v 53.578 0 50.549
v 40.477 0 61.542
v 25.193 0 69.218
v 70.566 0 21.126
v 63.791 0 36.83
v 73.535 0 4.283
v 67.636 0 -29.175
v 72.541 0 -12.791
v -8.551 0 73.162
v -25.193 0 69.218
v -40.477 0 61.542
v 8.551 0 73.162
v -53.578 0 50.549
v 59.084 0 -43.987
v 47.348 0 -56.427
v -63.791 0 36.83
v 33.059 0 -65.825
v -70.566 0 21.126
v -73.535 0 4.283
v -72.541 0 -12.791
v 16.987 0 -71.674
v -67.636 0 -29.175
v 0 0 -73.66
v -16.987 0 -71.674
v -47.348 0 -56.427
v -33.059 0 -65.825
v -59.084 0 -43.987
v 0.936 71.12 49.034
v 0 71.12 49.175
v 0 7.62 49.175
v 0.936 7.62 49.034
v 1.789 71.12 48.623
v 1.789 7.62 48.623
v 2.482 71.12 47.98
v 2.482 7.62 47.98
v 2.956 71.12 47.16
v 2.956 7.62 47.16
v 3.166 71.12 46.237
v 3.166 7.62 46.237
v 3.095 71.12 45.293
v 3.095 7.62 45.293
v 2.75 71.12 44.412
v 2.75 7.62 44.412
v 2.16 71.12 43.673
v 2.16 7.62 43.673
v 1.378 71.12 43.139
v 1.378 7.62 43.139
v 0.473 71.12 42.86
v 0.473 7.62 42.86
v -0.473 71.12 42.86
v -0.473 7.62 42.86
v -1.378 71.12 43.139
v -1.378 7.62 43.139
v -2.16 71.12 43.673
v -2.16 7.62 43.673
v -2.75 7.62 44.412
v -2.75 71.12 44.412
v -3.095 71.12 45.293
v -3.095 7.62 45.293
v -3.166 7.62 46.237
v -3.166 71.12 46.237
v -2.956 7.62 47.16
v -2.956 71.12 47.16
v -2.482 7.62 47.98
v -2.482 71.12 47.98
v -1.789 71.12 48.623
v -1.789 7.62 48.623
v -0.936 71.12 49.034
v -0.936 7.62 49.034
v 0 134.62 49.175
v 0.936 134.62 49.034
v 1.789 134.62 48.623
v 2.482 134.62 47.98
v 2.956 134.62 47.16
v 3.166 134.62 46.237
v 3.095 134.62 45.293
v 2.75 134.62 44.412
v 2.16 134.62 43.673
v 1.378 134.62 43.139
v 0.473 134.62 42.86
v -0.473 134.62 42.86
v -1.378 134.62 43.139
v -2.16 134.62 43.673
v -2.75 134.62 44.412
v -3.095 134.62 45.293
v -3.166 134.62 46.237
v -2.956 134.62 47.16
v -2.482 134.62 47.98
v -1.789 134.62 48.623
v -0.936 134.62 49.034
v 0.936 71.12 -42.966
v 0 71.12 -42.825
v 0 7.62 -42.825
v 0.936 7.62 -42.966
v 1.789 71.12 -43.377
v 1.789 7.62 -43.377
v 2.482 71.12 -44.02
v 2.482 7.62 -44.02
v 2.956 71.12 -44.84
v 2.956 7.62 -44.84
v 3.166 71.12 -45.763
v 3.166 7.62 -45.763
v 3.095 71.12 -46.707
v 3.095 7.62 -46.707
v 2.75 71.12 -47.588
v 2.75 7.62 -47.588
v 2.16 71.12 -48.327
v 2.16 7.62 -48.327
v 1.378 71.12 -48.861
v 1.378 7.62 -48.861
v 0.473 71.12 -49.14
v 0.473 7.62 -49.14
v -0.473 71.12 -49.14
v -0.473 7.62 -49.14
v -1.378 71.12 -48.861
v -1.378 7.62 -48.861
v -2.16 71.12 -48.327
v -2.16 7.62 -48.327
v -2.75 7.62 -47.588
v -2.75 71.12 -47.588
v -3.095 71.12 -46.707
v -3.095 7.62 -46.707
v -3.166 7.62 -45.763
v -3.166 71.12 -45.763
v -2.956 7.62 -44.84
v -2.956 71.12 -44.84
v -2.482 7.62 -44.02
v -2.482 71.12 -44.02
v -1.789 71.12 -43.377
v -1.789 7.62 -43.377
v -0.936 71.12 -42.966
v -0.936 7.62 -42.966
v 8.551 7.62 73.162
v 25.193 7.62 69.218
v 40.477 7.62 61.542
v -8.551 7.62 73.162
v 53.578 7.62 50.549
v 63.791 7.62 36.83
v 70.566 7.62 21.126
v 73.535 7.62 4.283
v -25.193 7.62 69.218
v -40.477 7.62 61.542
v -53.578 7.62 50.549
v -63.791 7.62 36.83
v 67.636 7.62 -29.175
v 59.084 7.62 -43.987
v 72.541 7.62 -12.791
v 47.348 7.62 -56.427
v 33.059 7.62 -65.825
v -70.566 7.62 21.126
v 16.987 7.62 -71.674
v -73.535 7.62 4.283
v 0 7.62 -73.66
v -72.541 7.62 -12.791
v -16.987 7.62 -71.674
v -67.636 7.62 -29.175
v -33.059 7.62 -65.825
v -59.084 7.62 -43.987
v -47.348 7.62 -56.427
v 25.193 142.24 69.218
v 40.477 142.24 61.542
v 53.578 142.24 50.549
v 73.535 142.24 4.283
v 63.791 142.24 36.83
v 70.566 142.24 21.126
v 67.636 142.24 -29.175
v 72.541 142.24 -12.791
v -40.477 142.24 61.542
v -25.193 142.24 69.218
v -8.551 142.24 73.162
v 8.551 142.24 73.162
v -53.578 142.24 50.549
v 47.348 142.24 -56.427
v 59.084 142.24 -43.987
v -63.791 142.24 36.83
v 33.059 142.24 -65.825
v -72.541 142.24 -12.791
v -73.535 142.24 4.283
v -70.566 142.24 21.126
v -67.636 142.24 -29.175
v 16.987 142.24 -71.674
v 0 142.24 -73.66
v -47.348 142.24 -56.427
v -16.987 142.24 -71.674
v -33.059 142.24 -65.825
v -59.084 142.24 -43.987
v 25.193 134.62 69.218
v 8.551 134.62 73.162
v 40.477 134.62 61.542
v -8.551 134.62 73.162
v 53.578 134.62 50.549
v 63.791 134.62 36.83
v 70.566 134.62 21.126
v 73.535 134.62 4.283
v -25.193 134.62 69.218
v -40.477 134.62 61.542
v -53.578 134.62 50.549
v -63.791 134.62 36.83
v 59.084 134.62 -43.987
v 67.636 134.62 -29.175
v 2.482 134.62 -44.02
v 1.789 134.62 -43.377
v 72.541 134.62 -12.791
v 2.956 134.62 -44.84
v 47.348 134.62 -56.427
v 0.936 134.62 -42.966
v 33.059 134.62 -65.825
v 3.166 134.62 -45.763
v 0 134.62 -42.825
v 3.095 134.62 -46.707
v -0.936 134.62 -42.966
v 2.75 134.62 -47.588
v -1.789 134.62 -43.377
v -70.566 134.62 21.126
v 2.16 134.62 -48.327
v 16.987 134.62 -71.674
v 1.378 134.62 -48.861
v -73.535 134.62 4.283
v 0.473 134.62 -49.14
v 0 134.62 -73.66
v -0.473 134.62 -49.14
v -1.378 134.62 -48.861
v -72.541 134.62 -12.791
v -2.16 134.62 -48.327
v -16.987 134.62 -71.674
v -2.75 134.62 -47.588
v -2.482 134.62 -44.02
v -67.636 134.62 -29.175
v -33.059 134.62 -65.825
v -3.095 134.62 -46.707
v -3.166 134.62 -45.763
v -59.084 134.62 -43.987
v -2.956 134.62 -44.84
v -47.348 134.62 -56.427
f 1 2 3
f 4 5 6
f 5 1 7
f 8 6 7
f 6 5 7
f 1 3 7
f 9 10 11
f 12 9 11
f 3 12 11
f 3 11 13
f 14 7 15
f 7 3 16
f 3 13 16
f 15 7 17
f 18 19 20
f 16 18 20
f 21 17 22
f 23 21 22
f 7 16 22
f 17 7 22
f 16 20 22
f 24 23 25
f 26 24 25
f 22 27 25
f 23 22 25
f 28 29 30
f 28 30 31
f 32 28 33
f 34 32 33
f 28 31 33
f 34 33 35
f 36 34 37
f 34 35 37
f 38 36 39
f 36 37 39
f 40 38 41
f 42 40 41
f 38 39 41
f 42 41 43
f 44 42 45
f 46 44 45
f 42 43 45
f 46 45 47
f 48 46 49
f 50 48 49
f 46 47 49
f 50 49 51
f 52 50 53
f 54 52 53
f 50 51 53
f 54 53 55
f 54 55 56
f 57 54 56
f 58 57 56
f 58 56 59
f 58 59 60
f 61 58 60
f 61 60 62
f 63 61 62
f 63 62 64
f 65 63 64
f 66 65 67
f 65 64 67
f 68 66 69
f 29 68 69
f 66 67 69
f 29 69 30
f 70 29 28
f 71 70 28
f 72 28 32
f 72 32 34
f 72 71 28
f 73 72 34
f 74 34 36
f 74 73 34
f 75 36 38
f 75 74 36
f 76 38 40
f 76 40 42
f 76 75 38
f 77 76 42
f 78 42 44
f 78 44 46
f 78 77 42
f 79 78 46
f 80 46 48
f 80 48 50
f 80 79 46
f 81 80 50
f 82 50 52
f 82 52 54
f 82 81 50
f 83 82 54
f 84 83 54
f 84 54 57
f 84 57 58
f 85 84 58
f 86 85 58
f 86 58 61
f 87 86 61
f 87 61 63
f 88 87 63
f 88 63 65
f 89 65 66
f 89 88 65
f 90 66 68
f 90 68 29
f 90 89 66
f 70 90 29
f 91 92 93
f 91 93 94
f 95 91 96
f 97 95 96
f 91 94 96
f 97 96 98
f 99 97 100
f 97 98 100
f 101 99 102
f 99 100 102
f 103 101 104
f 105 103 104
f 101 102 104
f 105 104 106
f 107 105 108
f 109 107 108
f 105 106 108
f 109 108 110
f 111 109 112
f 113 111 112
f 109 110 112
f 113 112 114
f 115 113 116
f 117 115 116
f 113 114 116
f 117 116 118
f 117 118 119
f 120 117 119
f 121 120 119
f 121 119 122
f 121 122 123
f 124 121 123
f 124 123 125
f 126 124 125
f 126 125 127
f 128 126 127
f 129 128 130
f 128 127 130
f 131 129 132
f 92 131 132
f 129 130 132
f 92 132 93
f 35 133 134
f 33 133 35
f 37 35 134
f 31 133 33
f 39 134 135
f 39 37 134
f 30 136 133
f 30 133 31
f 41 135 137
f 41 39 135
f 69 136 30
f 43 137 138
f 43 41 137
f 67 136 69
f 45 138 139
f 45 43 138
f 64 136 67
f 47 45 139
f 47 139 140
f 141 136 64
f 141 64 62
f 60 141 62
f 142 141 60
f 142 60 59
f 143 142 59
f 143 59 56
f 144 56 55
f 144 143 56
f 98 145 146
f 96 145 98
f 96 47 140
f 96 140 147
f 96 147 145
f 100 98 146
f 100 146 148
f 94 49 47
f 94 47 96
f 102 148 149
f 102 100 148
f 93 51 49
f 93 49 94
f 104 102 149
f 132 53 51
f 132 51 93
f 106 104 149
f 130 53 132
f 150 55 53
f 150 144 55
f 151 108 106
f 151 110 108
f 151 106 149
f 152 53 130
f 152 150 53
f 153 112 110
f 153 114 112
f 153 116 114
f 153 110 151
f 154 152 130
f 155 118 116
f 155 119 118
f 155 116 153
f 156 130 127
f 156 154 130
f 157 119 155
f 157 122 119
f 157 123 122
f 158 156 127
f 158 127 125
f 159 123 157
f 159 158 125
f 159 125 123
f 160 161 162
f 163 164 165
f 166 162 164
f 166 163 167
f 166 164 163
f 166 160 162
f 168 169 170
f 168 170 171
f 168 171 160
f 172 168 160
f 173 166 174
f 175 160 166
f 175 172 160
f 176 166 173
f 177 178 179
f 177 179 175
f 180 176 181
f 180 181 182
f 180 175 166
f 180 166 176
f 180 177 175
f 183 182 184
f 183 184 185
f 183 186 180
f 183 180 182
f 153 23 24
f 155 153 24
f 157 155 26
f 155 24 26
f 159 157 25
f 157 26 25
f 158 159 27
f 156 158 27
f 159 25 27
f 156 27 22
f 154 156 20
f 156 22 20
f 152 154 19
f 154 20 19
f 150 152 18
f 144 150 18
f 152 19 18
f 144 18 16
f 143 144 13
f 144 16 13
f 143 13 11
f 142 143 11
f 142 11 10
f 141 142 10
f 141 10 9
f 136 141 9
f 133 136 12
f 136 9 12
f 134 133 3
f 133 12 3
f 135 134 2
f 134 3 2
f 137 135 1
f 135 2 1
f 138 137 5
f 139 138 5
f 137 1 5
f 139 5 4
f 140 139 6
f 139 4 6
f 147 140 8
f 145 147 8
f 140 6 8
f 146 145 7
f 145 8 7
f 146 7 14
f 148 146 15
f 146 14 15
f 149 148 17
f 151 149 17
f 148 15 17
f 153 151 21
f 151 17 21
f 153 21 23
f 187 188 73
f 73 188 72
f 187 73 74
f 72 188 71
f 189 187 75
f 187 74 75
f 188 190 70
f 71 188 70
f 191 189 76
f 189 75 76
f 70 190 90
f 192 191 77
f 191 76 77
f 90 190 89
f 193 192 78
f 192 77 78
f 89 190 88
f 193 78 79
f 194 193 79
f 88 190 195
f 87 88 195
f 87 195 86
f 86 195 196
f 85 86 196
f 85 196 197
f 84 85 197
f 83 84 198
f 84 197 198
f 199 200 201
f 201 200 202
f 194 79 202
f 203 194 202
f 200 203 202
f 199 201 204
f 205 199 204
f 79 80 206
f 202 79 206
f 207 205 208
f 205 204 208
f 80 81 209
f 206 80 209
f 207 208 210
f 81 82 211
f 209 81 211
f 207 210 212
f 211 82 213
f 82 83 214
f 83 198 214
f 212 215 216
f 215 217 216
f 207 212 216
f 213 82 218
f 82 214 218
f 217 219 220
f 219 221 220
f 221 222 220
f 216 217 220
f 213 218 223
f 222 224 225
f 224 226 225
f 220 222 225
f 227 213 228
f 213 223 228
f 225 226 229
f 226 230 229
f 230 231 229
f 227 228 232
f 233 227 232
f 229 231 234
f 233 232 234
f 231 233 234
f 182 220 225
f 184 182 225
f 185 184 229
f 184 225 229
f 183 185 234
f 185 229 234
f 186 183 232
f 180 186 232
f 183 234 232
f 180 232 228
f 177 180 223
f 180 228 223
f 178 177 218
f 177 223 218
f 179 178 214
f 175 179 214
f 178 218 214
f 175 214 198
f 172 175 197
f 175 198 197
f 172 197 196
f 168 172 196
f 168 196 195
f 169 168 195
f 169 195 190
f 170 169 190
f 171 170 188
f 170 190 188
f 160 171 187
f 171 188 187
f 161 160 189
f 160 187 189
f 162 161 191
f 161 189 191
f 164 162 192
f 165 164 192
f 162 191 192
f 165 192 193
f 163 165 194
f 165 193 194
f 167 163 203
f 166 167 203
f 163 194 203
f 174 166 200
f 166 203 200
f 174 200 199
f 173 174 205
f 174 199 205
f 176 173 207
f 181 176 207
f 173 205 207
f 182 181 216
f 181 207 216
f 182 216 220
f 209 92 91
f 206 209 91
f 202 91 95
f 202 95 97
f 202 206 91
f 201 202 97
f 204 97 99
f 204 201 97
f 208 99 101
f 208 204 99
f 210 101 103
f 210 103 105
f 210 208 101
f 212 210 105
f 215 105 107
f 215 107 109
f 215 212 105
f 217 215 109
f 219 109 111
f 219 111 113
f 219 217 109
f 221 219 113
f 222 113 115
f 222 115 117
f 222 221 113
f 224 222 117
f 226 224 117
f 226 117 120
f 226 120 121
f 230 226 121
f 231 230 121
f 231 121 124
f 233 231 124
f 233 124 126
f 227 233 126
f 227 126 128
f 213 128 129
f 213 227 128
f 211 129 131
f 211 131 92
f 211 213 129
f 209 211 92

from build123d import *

# Parameters (mm, degrees)
SKETCH1_R           = 73.66
BOSS_EXTRUDE1_DEPTH = 7.62
SKETCH2_R           = 3.175
BOSS_EXTRUDE2_DEPTH = 63.5
SKETCH3_R           = 73.66
BOSS_EXTRUDE3_DEPTH = 7.62


with BuildPart() as part:
    # Sketch1 → Boss-Extrude1 (new body)
    with BuildSketch(Plane(origin=(0, 0, 0), x_dir=(1, 0, 0), z_dir=(0, 1, 0))):
        with Locations(Location((0, 0, 0), (0, 0, 90))):
            Circle(SKETCH1_R)
    extrude(amount=BOSS_EXTRUDE1_DEPTH)

    # Sketch2 → Boss-Extrude2 (add)
    with BuildSketch(Plane(origin=(0, 7.62, 0), x_dir=(1, 0, 0), z_dir=(0, 1, 0))):
        with Locations(Location((0, 46, 0), (0, 0, 270))):
            Circle(SKETCH2_R)
        with Locations(Location((0, -46, 0), (0, 0, 270))):
            Circle(SKETCH2_R)
    boss_extrude2 = extrude(amount=BOSS_EXTRUDE2_DEPTH)

    # Mirror1: Boss-Extrude2 across plane
    add(boss_extrude2.mirror(Plane.ZX.offset(71.12)))

    # Sketch3 → Boss-Extrude3 (add)
    with BuildSketch(Plane(origin=(0, 134.62, 0), x_dir=(1, 0, 0), z_dir=(0, 1, 0))):
        with Locations(Location((0, 0, 0), (0, 0, 90))):
            Circle(SKETCH3_R)
    extrude(amount=BOSS_EXTRUDE3_DEPTH)


solid = part.part
